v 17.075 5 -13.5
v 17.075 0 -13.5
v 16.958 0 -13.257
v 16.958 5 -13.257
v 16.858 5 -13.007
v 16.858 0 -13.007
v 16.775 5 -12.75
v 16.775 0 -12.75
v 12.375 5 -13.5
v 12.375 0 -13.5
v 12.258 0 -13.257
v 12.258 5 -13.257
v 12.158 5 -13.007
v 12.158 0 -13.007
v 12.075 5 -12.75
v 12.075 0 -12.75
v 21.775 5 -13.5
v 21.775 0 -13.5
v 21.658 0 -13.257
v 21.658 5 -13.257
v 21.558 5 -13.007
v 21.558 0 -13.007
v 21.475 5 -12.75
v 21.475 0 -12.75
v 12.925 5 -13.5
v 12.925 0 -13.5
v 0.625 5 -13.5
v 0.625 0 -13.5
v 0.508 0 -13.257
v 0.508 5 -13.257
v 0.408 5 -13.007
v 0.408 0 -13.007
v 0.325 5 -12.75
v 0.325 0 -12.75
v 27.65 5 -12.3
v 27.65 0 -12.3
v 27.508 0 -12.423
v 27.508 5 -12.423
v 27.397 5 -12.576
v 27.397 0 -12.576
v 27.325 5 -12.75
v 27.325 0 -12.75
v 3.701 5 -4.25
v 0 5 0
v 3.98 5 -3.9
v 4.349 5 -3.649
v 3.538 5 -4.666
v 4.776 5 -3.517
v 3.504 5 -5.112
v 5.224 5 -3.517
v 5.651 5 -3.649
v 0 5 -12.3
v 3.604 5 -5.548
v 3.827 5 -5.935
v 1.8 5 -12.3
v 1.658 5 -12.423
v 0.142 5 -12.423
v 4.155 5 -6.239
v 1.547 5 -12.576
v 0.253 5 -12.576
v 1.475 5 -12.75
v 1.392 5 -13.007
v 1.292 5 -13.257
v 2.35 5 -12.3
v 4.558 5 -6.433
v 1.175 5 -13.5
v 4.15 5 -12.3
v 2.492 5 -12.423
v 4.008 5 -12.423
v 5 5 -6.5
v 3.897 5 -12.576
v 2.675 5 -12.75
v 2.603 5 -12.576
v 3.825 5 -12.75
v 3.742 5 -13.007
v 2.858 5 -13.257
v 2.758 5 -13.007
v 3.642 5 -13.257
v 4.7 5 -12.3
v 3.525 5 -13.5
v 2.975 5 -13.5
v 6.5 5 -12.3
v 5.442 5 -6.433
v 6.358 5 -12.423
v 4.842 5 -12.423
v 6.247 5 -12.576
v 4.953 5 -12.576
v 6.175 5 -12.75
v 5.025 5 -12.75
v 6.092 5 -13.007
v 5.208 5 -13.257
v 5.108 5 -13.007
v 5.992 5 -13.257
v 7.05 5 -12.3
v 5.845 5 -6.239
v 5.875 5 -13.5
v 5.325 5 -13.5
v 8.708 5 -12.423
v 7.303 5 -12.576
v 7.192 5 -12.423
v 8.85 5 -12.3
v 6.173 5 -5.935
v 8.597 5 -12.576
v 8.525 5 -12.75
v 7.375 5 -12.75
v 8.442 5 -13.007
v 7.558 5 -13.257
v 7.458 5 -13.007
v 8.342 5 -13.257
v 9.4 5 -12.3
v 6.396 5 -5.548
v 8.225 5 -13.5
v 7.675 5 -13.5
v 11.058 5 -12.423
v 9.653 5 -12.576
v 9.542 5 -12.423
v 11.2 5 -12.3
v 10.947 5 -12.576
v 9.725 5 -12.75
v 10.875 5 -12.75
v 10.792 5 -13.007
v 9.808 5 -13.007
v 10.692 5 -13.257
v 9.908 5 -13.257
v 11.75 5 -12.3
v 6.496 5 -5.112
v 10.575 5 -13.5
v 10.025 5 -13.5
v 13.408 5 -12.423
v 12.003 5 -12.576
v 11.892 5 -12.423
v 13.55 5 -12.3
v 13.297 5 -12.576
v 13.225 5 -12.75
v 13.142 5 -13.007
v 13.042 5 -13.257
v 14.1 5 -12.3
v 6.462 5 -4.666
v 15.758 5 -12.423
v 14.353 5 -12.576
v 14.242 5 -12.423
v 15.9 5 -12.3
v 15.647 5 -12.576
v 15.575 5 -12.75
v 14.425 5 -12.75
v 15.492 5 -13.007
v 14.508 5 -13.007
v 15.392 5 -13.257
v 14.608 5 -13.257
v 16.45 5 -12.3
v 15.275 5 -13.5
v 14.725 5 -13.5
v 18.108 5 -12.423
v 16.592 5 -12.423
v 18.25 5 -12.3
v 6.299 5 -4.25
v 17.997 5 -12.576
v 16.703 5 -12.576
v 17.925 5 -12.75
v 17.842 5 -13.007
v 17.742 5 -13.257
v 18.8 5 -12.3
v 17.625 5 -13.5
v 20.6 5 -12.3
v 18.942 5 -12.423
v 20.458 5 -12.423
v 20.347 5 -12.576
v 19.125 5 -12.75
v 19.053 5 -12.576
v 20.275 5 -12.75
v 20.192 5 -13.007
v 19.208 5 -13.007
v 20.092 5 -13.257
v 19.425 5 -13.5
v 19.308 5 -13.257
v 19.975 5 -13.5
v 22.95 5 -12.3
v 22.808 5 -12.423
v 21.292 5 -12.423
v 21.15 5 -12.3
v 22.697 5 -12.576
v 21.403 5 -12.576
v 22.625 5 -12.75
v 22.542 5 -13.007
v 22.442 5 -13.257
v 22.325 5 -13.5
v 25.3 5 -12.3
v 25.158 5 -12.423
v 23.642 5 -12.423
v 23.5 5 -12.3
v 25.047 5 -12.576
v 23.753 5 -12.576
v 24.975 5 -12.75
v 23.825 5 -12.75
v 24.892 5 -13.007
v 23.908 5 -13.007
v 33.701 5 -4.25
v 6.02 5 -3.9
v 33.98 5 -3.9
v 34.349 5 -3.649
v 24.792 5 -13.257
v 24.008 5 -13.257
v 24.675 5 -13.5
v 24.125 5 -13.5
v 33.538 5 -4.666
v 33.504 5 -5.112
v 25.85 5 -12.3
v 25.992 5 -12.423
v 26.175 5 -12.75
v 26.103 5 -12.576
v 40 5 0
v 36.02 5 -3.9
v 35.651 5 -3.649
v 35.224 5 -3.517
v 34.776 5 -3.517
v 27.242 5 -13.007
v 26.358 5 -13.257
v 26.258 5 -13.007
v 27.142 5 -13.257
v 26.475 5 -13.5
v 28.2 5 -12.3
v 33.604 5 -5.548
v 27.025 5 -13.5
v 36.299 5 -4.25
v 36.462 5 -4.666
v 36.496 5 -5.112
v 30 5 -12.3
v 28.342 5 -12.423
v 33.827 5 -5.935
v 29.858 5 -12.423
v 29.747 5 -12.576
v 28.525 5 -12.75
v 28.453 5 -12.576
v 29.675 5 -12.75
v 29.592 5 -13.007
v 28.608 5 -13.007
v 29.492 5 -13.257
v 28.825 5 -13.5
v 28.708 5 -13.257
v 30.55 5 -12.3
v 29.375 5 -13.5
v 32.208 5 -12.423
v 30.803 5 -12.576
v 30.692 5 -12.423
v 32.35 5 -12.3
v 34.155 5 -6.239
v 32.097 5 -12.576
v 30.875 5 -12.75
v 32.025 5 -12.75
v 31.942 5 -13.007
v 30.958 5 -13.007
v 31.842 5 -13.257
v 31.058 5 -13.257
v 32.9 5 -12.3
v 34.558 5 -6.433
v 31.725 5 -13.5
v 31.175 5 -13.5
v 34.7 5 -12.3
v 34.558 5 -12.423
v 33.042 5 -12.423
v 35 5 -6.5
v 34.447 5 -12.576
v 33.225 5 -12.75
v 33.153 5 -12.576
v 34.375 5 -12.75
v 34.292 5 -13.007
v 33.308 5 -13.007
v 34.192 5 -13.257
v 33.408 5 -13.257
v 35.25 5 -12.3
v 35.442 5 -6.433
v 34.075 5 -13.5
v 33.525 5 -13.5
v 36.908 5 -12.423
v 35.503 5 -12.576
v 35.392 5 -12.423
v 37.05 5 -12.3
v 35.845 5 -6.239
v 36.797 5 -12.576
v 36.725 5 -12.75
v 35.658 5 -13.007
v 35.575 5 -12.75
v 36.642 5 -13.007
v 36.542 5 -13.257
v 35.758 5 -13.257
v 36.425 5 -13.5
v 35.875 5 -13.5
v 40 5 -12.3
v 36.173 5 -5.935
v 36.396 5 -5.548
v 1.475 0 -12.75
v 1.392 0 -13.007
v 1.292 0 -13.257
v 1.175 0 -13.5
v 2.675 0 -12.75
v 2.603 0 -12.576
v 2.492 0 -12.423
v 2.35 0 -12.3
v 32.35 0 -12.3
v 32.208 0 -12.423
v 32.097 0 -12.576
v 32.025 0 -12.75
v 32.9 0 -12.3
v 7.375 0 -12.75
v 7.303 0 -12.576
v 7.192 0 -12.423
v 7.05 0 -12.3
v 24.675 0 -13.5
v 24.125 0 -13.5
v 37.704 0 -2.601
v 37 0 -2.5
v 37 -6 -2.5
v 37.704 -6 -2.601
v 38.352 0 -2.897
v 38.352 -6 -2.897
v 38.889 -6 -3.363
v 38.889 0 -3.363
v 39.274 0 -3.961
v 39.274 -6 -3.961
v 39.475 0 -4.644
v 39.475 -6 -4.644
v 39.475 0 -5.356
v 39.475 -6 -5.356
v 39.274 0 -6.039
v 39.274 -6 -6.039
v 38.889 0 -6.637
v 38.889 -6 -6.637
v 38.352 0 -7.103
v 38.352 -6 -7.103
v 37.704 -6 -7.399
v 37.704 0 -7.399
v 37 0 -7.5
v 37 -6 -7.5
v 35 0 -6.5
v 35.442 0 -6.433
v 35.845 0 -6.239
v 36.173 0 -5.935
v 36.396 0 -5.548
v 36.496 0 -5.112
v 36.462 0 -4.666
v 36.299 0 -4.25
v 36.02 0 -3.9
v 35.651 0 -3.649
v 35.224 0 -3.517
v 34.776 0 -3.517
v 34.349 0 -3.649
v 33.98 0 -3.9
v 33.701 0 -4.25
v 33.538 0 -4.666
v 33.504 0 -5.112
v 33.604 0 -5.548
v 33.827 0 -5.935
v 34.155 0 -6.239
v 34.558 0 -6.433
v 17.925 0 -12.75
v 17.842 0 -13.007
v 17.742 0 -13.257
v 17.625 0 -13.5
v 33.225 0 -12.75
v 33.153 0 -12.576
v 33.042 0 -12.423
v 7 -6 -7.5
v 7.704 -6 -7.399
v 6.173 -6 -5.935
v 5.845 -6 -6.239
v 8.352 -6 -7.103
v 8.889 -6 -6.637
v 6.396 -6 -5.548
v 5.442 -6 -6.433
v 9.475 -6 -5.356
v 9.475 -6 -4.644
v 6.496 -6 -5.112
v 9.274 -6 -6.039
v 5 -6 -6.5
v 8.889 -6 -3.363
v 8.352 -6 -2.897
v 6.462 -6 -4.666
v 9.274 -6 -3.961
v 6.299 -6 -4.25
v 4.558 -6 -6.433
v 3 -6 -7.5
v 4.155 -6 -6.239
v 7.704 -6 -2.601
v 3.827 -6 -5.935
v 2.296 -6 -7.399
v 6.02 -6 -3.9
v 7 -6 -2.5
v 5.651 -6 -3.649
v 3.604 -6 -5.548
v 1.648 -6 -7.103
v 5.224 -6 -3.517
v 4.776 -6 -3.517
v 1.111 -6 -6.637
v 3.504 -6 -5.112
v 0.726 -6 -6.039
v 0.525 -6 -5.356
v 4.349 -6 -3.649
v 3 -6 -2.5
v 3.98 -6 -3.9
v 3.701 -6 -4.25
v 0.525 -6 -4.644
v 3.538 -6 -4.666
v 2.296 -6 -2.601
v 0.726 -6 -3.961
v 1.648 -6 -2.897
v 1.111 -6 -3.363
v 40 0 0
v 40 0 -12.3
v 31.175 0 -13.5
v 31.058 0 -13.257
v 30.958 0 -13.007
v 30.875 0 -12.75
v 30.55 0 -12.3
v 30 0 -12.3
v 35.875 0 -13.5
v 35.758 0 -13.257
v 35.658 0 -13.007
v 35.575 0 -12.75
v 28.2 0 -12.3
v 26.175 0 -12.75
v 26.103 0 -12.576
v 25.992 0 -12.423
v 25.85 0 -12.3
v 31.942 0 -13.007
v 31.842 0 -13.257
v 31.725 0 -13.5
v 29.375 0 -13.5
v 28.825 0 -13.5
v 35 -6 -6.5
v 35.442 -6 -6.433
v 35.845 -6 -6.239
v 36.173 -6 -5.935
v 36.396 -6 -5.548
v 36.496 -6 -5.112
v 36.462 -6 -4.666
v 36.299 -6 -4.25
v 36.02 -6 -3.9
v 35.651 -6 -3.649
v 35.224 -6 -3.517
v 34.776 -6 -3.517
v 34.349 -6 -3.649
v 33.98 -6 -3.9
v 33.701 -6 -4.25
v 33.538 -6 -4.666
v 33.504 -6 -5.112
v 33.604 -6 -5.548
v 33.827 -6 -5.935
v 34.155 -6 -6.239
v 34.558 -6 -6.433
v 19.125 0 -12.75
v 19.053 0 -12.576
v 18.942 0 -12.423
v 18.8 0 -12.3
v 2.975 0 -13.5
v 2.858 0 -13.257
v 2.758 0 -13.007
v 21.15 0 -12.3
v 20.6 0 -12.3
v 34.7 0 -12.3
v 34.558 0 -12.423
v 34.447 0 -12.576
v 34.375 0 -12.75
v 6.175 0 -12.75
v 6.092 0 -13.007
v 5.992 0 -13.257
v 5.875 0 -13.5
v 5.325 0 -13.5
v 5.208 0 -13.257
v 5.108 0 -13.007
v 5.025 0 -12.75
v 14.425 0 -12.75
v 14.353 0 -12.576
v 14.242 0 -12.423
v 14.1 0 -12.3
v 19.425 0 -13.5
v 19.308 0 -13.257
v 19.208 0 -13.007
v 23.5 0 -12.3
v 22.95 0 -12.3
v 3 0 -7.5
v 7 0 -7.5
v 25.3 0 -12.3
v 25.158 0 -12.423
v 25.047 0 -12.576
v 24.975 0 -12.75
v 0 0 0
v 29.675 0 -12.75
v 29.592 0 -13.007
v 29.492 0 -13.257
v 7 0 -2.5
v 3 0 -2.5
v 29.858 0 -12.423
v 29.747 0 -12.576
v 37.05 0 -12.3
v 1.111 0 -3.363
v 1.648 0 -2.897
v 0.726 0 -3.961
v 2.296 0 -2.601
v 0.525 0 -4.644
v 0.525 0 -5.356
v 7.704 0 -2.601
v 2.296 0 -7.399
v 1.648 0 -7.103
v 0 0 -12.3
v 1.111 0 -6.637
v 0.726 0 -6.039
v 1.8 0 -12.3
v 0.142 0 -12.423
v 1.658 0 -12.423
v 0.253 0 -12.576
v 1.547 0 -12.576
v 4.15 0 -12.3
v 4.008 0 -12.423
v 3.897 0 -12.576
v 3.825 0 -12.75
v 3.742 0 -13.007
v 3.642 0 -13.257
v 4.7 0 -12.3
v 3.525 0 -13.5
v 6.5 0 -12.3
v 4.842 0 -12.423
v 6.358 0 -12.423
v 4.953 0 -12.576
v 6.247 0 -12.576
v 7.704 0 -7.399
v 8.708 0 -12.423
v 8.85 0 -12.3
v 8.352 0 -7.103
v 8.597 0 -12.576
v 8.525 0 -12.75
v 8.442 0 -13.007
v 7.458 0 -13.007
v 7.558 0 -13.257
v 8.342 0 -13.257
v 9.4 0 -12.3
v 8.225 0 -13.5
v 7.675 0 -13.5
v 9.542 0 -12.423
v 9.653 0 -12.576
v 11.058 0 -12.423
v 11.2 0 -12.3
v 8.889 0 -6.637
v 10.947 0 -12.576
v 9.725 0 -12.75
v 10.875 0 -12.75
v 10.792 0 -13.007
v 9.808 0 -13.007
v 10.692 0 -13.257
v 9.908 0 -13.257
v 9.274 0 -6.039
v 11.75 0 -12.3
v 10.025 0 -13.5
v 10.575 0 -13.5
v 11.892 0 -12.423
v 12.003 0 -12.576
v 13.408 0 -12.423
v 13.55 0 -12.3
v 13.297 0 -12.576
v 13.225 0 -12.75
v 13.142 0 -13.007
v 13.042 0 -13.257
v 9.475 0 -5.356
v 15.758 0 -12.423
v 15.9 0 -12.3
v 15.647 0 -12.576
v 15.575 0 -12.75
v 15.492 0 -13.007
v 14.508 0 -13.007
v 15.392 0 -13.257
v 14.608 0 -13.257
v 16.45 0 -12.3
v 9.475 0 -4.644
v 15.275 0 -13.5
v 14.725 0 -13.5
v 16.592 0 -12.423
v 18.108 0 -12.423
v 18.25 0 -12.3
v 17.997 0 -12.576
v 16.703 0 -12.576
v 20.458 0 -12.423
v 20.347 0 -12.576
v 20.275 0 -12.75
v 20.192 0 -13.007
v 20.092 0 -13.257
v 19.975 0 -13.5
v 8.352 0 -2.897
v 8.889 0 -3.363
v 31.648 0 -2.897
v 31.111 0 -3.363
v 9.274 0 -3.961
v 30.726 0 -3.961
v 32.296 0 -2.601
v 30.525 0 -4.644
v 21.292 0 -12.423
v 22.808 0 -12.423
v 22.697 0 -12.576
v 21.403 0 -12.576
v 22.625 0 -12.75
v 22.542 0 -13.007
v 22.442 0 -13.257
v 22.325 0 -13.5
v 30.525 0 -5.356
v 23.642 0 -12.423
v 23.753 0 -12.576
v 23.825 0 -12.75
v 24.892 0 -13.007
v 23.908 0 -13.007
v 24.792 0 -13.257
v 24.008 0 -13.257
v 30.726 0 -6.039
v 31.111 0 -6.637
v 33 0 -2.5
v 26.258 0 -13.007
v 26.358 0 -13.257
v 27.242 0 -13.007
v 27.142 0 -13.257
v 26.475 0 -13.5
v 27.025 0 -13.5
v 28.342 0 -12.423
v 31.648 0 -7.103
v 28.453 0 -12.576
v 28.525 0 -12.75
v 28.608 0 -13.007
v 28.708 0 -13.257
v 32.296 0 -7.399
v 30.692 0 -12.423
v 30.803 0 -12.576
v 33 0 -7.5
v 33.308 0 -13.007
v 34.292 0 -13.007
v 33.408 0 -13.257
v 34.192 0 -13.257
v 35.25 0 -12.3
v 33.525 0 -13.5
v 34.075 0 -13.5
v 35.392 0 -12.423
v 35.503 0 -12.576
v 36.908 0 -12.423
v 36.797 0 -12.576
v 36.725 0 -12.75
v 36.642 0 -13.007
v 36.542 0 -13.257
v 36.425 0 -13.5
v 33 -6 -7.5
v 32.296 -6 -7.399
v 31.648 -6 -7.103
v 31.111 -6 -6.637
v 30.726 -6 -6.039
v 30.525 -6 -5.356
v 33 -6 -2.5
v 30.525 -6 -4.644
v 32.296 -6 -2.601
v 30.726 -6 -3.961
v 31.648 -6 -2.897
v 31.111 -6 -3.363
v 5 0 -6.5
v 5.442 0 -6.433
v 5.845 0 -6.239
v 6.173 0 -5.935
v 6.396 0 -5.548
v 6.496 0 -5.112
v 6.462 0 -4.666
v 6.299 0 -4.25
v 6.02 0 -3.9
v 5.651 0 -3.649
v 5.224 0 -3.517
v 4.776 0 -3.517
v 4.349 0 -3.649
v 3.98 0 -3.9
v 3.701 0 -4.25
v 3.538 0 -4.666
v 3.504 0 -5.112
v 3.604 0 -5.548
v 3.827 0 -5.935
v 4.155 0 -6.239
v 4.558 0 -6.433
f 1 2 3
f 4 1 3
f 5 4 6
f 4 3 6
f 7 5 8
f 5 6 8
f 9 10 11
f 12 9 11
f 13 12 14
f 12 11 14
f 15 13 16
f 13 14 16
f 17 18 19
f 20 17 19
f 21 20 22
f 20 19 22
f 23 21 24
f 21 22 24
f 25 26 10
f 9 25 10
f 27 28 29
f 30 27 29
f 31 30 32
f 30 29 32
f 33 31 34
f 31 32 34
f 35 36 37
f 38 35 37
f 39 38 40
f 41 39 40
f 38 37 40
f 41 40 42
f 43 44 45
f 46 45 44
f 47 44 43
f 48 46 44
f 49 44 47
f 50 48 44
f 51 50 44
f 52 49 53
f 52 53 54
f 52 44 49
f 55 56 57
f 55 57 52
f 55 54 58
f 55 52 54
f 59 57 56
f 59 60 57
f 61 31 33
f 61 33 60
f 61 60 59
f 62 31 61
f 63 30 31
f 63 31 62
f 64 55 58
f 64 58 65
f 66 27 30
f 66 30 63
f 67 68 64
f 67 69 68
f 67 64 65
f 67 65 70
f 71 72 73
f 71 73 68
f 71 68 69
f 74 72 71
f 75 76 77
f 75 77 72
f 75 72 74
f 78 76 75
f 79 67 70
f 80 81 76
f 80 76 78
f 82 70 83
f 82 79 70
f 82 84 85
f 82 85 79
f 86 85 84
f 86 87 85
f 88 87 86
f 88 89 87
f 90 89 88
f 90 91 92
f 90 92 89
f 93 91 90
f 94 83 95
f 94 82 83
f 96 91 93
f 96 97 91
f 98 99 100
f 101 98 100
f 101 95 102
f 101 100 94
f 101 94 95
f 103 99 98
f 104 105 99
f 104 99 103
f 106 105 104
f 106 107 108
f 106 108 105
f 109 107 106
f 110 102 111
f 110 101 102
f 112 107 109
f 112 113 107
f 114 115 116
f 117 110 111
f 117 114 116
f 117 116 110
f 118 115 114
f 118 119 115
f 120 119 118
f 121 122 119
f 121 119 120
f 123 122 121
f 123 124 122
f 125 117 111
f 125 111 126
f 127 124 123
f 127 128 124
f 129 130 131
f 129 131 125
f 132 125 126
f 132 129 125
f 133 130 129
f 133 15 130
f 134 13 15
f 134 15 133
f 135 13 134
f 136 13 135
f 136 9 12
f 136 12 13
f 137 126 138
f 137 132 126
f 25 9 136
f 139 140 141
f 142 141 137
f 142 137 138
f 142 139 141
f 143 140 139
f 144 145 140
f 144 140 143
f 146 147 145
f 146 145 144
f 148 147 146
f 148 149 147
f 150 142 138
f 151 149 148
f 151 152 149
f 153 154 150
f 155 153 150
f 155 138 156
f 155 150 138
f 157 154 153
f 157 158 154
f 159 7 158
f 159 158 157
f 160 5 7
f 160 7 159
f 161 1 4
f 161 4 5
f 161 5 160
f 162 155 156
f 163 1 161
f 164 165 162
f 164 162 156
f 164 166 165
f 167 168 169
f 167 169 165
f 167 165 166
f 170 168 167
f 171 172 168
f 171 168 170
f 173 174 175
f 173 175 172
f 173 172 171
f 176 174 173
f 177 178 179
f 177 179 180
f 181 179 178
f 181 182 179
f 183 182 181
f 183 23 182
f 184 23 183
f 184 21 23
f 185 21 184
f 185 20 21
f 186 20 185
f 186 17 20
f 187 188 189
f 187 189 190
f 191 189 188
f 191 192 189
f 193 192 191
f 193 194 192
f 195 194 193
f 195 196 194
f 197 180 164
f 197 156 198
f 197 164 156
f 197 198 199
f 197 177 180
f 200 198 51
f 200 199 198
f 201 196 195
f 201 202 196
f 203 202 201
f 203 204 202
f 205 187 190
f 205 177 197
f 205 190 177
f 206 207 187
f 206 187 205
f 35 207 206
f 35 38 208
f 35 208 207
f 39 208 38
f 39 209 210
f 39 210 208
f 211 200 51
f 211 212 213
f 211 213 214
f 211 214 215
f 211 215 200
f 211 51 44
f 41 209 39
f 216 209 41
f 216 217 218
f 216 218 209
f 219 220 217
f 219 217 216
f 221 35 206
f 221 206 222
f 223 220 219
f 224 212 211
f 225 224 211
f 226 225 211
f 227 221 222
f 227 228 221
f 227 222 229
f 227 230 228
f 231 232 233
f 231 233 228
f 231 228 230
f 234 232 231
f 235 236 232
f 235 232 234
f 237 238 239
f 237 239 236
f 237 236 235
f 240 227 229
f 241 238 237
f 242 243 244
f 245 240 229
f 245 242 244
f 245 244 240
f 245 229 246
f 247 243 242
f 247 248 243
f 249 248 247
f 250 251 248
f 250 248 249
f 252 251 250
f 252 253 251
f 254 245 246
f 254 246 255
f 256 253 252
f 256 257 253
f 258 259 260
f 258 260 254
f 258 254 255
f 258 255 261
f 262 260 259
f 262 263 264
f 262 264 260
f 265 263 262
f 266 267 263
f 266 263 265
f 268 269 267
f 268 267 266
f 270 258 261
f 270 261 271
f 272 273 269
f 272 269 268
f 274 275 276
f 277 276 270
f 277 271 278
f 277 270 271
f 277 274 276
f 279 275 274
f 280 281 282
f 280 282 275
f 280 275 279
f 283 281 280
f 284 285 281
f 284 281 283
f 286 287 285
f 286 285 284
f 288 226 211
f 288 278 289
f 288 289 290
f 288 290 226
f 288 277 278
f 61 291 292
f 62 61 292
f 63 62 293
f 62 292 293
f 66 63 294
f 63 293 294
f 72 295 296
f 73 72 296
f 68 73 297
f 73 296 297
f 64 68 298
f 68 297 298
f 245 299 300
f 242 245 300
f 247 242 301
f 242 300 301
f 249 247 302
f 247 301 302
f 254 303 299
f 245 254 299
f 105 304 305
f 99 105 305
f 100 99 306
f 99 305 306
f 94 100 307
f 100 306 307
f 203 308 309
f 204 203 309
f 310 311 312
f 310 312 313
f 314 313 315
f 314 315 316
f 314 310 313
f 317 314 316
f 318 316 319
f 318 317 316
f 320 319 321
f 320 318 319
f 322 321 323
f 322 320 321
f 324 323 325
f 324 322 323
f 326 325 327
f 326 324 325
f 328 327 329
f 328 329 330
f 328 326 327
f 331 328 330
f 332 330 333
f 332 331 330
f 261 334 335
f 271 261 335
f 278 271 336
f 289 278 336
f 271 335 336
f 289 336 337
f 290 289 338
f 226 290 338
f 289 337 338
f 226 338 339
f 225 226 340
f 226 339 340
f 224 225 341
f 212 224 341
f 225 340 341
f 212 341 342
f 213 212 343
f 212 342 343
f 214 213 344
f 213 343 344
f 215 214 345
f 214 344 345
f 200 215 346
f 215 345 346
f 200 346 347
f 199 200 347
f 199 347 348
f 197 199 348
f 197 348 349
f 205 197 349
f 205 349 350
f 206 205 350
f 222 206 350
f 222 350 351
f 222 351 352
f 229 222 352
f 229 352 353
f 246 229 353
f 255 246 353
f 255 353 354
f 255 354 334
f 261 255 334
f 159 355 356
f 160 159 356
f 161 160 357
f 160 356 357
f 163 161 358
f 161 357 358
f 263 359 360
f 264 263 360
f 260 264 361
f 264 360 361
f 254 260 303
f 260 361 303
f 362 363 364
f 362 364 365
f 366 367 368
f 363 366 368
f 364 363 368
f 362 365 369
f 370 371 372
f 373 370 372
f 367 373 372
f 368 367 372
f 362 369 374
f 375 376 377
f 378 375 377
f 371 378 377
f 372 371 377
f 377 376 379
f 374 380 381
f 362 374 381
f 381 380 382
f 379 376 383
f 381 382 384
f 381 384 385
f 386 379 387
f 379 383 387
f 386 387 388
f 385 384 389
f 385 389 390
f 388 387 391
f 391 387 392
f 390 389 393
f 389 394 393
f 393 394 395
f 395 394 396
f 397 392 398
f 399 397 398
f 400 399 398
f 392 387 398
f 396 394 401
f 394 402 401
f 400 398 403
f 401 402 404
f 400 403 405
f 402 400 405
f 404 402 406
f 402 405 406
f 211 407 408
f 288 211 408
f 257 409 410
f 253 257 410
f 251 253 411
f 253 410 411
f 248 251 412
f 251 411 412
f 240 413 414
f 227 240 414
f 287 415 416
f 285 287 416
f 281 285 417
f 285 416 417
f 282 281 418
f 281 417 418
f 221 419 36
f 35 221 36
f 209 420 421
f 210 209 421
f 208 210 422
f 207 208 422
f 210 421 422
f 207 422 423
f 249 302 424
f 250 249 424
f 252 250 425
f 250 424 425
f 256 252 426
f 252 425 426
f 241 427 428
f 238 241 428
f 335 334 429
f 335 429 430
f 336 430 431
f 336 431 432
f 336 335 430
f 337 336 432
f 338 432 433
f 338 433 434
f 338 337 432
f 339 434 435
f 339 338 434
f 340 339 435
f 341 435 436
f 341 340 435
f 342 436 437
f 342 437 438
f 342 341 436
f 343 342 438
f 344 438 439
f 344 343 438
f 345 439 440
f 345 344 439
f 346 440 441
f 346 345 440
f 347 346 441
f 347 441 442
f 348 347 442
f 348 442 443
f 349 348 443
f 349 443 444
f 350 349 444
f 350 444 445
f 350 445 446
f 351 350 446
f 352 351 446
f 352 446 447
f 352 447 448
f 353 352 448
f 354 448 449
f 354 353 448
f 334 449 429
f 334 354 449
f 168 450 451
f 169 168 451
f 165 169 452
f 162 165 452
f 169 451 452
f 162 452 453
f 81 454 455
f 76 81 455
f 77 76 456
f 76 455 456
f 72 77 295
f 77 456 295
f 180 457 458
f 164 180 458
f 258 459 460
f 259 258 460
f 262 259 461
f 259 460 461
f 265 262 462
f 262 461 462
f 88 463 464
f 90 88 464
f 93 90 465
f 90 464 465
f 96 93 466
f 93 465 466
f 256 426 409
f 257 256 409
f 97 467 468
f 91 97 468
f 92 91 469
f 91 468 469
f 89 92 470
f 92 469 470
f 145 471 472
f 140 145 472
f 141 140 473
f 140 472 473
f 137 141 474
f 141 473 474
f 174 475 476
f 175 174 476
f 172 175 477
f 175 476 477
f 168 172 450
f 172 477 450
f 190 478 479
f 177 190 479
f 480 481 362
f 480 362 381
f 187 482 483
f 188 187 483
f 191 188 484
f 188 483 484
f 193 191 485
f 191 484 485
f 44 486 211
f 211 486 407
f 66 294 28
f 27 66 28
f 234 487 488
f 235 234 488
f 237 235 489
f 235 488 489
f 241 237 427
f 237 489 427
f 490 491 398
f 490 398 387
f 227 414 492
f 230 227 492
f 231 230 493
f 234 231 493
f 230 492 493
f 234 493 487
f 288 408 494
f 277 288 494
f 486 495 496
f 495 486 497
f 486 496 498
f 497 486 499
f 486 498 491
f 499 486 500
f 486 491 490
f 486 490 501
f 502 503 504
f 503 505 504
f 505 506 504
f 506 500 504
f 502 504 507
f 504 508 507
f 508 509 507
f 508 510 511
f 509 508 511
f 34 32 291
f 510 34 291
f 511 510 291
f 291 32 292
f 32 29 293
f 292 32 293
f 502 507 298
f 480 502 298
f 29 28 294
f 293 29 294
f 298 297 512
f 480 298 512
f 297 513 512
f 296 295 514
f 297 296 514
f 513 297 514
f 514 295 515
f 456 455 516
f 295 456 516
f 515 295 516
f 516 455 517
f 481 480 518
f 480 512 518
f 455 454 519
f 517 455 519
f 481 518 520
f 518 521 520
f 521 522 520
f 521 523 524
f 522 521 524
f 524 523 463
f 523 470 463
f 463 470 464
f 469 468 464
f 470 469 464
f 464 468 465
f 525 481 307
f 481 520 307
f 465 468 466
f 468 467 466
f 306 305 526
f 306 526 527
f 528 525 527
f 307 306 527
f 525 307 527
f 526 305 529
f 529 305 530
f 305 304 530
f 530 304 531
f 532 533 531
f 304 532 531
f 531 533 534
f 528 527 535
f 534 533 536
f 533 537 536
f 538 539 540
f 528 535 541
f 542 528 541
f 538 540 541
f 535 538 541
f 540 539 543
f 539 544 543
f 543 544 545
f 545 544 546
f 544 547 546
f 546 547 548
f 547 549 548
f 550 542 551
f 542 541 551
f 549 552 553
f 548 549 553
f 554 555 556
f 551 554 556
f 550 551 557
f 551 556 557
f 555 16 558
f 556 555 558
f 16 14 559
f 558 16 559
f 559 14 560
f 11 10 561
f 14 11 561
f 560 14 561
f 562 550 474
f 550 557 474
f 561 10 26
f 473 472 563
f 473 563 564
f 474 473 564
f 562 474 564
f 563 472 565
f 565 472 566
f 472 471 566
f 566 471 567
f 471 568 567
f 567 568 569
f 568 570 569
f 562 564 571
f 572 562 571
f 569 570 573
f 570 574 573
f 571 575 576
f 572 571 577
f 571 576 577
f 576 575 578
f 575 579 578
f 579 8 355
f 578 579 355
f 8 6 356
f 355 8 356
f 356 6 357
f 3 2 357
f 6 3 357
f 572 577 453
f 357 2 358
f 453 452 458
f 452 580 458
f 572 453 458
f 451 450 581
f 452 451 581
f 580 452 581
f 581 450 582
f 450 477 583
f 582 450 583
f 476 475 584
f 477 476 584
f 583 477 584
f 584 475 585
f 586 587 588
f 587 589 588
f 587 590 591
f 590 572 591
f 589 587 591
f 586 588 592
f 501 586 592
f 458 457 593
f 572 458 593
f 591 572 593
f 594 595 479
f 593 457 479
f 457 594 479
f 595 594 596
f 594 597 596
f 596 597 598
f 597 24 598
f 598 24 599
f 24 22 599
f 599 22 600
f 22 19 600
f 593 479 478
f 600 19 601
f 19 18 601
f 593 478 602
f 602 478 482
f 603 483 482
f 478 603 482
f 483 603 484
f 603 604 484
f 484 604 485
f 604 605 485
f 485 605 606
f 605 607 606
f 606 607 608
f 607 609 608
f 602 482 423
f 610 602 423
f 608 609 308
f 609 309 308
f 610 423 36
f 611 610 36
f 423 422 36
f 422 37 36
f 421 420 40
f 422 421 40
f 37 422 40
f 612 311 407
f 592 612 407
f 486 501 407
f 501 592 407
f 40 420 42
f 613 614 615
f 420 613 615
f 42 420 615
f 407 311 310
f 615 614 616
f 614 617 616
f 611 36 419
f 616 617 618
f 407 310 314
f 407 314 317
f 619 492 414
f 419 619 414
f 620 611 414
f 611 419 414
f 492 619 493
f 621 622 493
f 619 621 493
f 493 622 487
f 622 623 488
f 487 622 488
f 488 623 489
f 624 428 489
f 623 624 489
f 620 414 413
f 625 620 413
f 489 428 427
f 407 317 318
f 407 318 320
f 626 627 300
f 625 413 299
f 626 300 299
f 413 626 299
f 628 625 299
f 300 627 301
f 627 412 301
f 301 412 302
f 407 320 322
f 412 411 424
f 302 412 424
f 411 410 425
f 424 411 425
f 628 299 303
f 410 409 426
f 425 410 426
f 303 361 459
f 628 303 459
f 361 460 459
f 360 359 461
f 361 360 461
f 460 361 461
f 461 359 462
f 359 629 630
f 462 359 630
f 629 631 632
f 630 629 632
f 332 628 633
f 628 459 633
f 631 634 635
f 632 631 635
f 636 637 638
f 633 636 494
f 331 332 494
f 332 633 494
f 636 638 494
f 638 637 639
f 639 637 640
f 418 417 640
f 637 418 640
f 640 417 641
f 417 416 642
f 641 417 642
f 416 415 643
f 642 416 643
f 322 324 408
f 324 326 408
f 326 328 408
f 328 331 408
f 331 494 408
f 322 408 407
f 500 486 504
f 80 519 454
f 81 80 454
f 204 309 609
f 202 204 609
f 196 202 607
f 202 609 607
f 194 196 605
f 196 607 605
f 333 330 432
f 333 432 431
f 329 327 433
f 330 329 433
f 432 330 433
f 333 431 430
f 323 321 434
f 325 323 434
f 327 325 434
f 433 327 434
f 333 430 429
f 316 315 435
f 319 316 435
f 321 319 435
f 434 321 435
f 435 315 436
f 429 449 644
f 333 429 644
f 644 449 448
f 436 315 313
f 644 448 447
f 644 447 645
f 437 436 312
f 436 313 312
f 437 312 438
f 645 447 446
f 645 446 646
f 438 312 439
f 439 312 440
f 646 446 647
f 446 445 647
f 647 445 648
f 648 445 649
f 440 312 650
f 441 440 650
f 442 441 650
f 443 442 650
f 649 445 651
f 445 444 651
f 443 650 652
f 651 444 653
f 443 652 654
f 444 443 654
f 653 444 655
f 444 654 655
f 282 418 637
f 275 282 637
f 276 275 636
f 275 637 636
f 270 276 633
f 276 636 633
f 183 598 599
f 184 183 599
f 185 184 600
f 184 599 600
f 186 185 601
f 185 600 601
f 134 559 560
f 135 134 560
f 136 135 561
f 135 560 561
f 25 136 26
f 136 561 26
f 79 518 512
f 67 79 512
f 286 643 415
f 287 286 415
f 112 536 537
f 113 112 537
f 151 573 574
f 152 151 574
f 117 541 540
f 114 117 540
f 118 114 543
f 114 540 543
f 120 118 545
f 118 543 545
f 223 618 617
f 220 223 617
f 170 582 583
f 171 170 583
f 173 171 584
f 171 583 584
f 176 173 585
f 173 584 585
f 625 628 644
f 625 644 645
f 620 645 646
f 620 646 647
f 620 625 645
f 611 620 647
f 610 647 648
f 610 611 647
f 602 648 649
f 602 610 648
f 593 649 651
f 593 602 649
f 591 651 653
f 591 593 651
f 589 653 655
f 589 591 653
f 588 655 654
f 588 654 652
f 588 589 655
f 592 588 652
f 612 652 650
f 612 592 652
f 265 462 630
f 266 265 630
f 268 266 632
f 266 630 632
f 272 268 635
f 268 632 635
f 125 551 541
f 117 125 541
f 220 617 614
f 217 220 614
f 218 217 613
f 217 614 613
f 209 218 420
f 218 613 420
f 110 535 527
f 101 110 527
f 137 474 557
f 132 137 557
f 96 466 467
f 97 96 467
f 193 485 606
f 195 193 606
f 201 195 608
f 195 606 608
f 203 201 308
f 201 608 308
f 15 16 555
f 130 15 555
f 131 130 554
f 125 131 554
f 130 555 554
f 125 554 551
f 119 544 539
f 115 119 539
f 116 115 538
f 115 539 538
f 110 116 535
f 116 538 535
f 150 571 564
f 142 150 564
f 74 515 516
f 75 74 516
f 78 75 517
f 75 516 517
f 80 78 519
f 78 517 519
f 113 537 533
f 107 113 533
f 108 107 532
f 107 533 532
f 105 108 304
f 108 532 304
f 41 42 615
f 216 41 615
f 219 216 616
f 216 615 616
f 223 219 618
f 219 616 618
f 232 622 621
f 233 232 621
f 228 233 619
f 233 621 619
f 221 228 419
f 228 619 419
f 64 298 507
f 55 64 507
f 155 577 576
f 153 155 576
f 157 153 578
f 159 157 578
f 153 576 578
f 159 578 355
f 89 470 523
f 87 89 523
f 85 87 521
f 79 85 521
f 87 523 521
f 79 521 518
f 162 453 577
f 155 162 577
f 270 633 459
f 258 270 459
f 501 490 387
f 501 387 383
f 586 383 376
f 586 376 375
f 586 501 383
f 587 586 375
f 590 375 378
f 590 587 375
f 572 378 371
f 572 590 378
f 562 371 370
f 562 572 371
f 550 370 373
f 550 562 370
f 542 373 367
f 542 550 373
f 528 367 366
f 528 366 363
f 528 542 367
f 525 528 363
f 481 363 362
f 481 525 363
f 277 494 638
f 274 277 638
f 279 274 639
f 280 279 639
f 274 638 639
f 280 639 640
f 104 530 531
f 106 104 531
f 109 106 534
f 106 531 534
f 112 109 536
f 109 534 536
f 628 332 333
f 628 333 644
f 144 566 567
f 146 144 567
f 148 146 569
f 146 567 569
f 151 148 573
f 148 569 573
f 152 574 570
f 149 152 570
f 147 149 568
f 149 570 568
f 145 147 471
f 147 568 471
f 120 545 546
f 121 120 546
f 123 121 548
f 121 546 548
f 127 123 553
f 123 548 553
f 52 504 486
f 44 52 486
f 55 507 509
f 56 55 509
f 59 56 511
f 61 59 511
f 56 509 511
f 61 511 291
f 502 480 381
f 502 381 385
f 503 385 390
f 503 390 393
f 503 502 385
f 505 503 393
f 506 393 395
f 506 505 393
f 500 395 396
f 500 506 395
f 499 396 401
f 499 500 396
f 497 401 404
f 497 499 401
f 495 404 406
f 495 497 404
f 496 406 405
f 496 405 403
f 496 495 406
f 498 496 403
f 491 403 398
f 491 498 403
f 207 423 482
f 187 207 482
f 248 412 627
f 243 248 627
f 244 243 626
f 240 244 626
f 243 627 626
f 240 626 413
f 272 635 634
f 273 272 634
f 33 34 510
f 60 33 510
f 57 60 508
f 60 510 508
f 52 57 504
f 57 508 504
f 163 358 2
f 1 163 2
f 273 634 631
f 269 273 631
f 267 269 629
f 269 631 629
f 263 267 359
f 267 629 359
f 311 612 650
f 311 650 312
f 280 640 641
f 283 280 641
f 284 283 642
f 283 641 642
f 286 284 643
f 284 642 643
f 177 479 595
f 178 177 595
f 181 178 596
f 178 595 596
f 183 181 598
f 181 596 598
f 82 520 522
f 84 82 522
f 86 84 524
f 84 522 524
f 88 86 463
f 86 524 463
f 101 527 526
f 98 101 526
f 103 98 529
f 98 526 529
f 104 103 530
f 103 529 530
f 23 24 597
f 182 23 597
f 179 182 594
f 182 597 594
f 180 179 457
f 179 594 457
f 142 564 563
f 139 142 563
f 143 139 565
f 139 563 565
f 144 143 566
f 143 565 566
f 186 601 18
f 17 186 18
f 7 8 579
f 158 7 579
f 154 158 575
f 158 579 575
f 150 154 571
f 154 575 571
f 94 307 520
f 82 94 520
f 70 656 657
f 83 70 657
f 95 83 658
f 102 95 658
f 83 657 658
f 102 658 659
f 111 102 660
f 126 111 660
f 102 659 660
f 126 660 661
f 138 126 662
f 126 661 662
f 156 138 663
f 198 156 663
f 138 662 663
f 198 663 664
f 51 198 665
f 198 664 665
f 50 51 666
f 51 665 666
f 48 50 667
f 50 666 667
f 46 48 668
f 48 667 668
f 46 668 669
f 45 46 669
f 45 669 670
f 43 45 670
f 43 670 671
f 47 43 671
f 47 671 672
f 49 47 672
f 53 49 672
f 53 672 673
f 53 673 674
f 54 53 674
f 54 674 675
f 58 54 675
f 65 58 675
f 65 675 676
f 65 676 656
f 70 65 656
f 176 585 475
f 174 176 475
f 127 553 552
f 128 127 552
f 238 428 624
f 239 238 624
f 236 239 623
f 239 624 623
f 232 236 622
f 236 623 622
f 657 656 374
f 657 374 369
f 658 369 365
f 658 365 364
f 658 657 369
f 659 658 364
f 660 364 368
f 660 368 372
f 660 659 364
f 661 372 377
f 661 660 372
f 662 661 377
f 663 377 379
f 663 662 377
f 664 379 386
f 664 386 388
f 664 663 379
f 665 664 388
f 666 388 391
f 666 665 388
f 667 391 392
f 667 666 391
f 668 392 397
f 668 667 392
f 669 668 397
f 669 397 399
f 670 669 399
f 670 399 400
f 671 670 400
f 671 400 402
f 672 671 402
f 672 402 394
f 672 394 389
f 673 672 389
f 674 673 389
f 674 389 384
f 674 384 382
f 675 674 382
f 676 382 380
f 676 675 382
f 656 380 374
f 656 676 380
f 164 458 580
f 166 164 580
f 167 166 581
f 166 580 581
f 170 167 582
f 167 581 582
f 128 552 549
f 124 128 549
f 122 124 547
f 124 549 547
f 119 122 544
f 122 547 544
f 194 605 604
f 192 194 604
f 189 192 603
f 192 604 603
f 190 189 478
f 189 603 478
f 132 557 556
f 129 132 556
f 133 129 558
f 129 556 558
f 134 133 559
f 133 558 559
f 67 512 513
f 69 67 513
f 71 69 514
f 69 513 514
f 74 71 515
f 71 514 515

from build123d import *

# Parameters (mm, degrees)
BOSS_EXTRUDE1_DEPTH = 5
SKETCH2_R           = 1.5
BOSS_EXTRUDE2_DEPTH = 6
CUT_EXTRUDE1_REACH  = 44.641
SKETCH3_R           = 1.5


with BuildPart() as part:
    # Sketch1 → Boss-Extrude1 (new body)
    with BuildSketch(Plane(origin=(0, 0, 0), x_dir=(1, 0, 0), z_dir=(0, 1, 0))):
        with BuildLine():
            Line((0, 0), (40, 0))
            Line((40, 0), (40, 12.3))
            Line((40, 12.3), (37.05, 12.3))
            ThreePointArc((37.05, 12.3), (36.84816772, 12.496593354), (36.725, 12.75))
            ThreePointArc((36.725, 12.75), (36.593980723, 13.132592289), (36.425, 13.5))
            Line((36.425, 13.5), (35.875, 13.5))
            ThreePointArc((35.875, 13.5), (35.706019277, 13.132592289), (35.575, 12.75))
            ThreePointArc((35.575, 12.75), (35.45183228, 12.496593354), (35.25, 12.3))
            Line((35.25, 12.3), (34.7, 12.3))
            ThreePointArc((34.7, 12.3), (34.49816772, 12.496593354), (34.375, 12.75))
            ThreePointArc((34.375, 12.75), (34.243980723, 13.132592289), (34.075, 13.5))
            Line((34.075, 13.5), (33.525, 13.5))
            ThreePointArc((33.525, 13.5), (33.356019277, 13.132592289), (33.225, 12.75))
            ThreePointArc((33.225, 12.75), (33.10183228, 12.496593354), (32.9, 12.3))
            Line((32.9, 12.3), (32.35, 12.3))
            ThreePointArc((32.35, 12.3), (32.14816772, 12.496593354), (32.025, 12.75))
            ThreePointArc((32.025, 12.75), (31.893980723, 13.132592289), (31.725, 13.5))
            Line((31.725, 13.5), (31.175, 13.5))
            ThreePointArc((31.175, 13.5), (31.006019277, 13.132592289), (30.875, 12.75))
            ThreePointArc((30.875, 12.75), (30.75183228, 12.496593354), (30.55, 12.3))
            Line((30.55, 12.3), (30, 12.3))
            ThreePointArc((30, 12.3), (29.79816772, 12.496593354), (29.675, 12.75))
            ThreePointArc((29.675, 12.75), (29.543980723, 13.132592289), (29.375, 13.5))
            Line((29.375, 13.5), (28.825, 13.5))
            ThreePointArc((28.825, 13.5), (28.656019277, 13.132592289), (28.525, 12.75))
            ThreePointArc((28.525, 12.75), (28.40183228, 12.496593354), (28.2, 12.3))
            Line((28.2, 12.3), (27.65, 12.3))
            ThreePointArc((27.65, 12.3), (27.44816772, 12.496593354), (27.325, 12.75))
            ThreePointArc((27.325, 12.75), (27.193980723, 13.132592289), (27.025, 13.5))
            Line((27.025, 13.5), (26.475, 13.5))
            ThreePointArc((26.475, 13.5), (26.306019277, 13.132592289), (26.175, 12.75))
            ThreePointArc((26.175, 12.75), (26.05183228, 12.496593354), (25.85, 12.3))
            Line((25.85, 12.3), (25.3, 12.3))
            ThreePointArc((25.3, 12.3), (25.09816772, 12.496593354), (24.975, 12.75))
            ThreePointArc((24.975, 12.75), (24.843980723, 13.132592289), (24.675, 13.5))
            Line((24.675, 13.5), (24.125, 13.5))
            ThreePointArc((24.125, 13.5), (23.956019277, 13.132592289), (23.825, 12.75))
            ThreePointArc((23.825, 12.75), (23.70183228, 12.496593354), (23.5, 12.3))
            Line((23.5, 12.3), (22.95, 12.3))
            ThreePointArc((22.95, 12.3), (22.74816772, 12.496593354), (22.625, 12.75))
            ThreePointArc((22.625, 12.75), (22.493980723, 13.132592289), (22.325, 13.5))
            Line((22.325, 13.5), (21.775, 13.5))
            ThreePointArc((21.775, 13.5), (21.606019277, 13.132592289), (21.475, 12.75))
            ThreePointArc((21.475, 12.75), (21.35183228, 12.496593354), (21.15, 12.3))
            Line((21.15, 12.3), (20.6, 12.3))
            ThreePointArc((20.6, 12.3), (20.39816772, 12.496593354), (20.275, 12.75))
            ThreePointArc((20.275, 12.75), (20.143980723, 13.132592289), (19.975, 13.5))
            Line((19.975, 13.5), (19.425, 13.5))
            ThreePointArc((19.425, 13.5), (19.256019277, 13.132592289), (19.125, 12.75))
            ThreePointArc((19.125, 12.75), (19.00183228, 12.496593354), (18.8, 12.3))
            Line((18.8, 12.3), (18.25, 12.3))
            ThreePointArc((18.25, 12.3), (18.04816772, 12.496593354), (17.925, 12.75))
            ThreePointArc((17.925, 12.75), (17.793980723, 13.132592289), (17.625, 13.5))
            Line((17.625, 13.5), (17.075, 13.5))
            ThreePointArc((17.075, 13.5), (16.906019277, 13.132592289), (16.775, 12.75))
            ThreePointArc((16.775, 12.75), (16.65183228, 12.496593354), (16.45, 12.3))
            Line((16.45, 12.3), (15.9, 12.3))
            ThreePointArc((15.9, 12.3), (15.69816772, 12.496593354), (15.575, 12.75))
            ThreePointArc((15.575, 12.75), (15.443980723, 13.132592289), (15.275, 13.5))
            Line((15.275, 13.5), (14.725, 13.5))
            ThreePointArc((14.725, 13.5), (14.556019277, 13.132592289), (14.425, 12.75))
            ThreePointArc((14.425, 12.75), (14.30183228, 12.496593354), (14.1, 12.3))
            Line((14.1, 12.3), (13.55, 12.3))
            ThreePointArc((13.55, 12.3), (13.34816772, 12.496593354), (13.225, 12.75))
            ThreePointArc((13.225, 12.75), (13.093980723, 13.132592289), (12.925, 13.5))
            Line((12.925, 13.5), (12.375, 13.5))
            ThreePointArc((12.375, 13.5), (12.206019277, 13.132592289), (12.075, 12.75))
            ThreePointArc((12.075, 12.75), (11.95183228, 12.496593354), (11.75, 12.3))
            Line((11.75, 12.3), (11.2, 12.3))
            ThreePointArc((11.2, 12.3), (10.99816772, 12.496593354), (10.875, 12.75))
            ThreePointArc((10.875, 12.75), (10.743980723, 13.132592289), (10.575, 13.5))
            Line((10.575, 13.5), (10.025, 13.5))
            ThreePointArc((10.025, 13.5), (9.856019277, 13.132592289), (9.725, 12.75))
            ThreePointArc((9.725, 12.75), (9.60183228, 12.496593354), (9.4, 12.3))
            Line((9.4, 12.3), (8.85, 12.3))
            ThreePointArc((8.85, 12.3), (8.64816772, 12.496593354), (8.525, 12.75))
            ThreePointArc((8.525, 12.75), (8.393980723, 13.132592289), (8.225, 13.5))
            Line((8.225, 13.5), (7.675, 13.5))
            ThreePointArc((7.675, 13.5), (7.506019277, 13.132592289), (7.375, 12.75))
            ThreePointArc((7.375, 12.75), (7.25183228, 12.496593354), (7.05, 12.3))
            Line((7.05, 12.3), (6.5, 12.3))
            ThreePointArc((6.5, 12.3), (6.29816772, 12.496593354), (6.175, 12.75))
            ThreePointArc((6.175, 12.75), (6.043980723, 13.132592289), (5.875, 13.5))
            Line((5.875, 13.5), (5.325, 13.5))
            ThreePointArc((5.325, 13.5), (5.156019277, 13.132592289), (5.025, 12.75))
            ThreePointArc((5.025, 12.75), (4.90183228, 12.496593354), (4.7, 12.3))
            Line((4.7, 12.3), (4.15, 12.3))
            ThreePointArc((4.15, 12.3), (3.94816772, 12.496593354), (3.825, 12.75))
            ThreePointArc((3.825, 12.75), (3.693980723, 13.132592289), (3.525, 13.5))
            Line((3.525, 13.5), (2.975, 13.5))
            ThreePointArc((2.975, 13.5), (2.806019277, 13.132592289), (2.675, 12.75))
            ThreePointArc((2.675, 12.75), (2.55183228, 12.496593354), (2.35, 12.3))
            Line((2.35, 12.3), (1.8, 12.3))
            ThreePointArc((1.8, 12.3), (1.59816772, 12.496593354), (1.475, 12.75))
            ThreePointArc((1.475, 12.75), (1.343980723, 13.132592289), (1.175, 13.5))
            Line((1.175, 13.5), (0.625, 13.5))
            ThreePointArc((0.625, 13.5), (0.456019277, 13.132592289), (0.325, 12.75))
            ThreePointArc((0.325, 12.75), (0.20183228, 12.496593354), (0, 12.3))
            Line((0, 12.3), (0, 0))
        make_face()
    extrude(amount=BOSS_EXTRUDE1_DEPTH)

    # Sketch2 → Boss-Extrude2 (add)
    # profile 1 of 2: a face of its own
    with BuildSketch(Plane.XZ):
        with BuildLine():
            Line((7, -7.5), (3, -7.5))
            ThreePointArc((3, -7.5), (0.5, -5), (3, -2.5))
            Line((3, -2.5), (7, -2.5))
            ThreePointArc((7, -2.5), (9.5, -5), (7, -7.5))
        make_face()
        with Locations(Location((5, -5, 0), (0, 0, 270))):
            Circle(SKETCH2_R, mode=Mode.SUBTRACT)
    # profile 2 of 2: a face of its own
    with BuildSketch(Plane.XZ):
        with BuildLine():
            Line((37, -7.5), (33, -7.5))
            ThreePointArc((33, -7.5), (30.5, -5), (33, -2.5))
            Line((33, -2.5), (37, -2.5))
            ThreePointArc((37, -2.5), (39.5, -5), (37, -7.5))
        make_face()
        with Locations(Location((35, -5, 0), (0, 0, 270))):
            Circle(SKETCH2_R, mode=Mode.SUBTRACT)
    extrude(amount=BOSS_EXTRUDE2_DEPTH)

    # Sketch3 → Cut-Extrude1 (cut, up to next)
    with BuildSketch(Plane.XZ, mode=Mode.PRIVATE) as cut_extrude1_sk1:
        with Locations(Location((35, -5, 0), (0, 0, 270))):
            Circle(SKETCH3_R)
    cut_extrude1_tool1 = extrude(cut_extrude1_sk1.sketch, amount=-CUT_EXTRUDE1_REACH, mode=Mode.PRIVATE) & part.part
    # Sketch3 → Cut-Extrude1 (cut, up to next)
    with BuildSketch(Plane.XZ, mode=Mode.PRIVATE) as cut_extrude1_sk2:
        with Locations(Location((5, -5, 0), (0, 0, 270))):
            Circle(SKETCH3_R)
    cut_extrude1_tool2 = extrude(cut_extrude1_sk2.sketch, amount=-CUT_EXTRUDE1_REACH, mode=Mode.PRIVATE) & part.part
    add(cut_extrude1_tool1.solids().sort_by_distance((35, 0, -5))[0], mode=Mode.SUBTRACT)
    add(cut_extrude1_tool2.solids().sort_by_distance((5, 0, -5))[0], mode=Mode.SUBTRACT)


solid = part.part
